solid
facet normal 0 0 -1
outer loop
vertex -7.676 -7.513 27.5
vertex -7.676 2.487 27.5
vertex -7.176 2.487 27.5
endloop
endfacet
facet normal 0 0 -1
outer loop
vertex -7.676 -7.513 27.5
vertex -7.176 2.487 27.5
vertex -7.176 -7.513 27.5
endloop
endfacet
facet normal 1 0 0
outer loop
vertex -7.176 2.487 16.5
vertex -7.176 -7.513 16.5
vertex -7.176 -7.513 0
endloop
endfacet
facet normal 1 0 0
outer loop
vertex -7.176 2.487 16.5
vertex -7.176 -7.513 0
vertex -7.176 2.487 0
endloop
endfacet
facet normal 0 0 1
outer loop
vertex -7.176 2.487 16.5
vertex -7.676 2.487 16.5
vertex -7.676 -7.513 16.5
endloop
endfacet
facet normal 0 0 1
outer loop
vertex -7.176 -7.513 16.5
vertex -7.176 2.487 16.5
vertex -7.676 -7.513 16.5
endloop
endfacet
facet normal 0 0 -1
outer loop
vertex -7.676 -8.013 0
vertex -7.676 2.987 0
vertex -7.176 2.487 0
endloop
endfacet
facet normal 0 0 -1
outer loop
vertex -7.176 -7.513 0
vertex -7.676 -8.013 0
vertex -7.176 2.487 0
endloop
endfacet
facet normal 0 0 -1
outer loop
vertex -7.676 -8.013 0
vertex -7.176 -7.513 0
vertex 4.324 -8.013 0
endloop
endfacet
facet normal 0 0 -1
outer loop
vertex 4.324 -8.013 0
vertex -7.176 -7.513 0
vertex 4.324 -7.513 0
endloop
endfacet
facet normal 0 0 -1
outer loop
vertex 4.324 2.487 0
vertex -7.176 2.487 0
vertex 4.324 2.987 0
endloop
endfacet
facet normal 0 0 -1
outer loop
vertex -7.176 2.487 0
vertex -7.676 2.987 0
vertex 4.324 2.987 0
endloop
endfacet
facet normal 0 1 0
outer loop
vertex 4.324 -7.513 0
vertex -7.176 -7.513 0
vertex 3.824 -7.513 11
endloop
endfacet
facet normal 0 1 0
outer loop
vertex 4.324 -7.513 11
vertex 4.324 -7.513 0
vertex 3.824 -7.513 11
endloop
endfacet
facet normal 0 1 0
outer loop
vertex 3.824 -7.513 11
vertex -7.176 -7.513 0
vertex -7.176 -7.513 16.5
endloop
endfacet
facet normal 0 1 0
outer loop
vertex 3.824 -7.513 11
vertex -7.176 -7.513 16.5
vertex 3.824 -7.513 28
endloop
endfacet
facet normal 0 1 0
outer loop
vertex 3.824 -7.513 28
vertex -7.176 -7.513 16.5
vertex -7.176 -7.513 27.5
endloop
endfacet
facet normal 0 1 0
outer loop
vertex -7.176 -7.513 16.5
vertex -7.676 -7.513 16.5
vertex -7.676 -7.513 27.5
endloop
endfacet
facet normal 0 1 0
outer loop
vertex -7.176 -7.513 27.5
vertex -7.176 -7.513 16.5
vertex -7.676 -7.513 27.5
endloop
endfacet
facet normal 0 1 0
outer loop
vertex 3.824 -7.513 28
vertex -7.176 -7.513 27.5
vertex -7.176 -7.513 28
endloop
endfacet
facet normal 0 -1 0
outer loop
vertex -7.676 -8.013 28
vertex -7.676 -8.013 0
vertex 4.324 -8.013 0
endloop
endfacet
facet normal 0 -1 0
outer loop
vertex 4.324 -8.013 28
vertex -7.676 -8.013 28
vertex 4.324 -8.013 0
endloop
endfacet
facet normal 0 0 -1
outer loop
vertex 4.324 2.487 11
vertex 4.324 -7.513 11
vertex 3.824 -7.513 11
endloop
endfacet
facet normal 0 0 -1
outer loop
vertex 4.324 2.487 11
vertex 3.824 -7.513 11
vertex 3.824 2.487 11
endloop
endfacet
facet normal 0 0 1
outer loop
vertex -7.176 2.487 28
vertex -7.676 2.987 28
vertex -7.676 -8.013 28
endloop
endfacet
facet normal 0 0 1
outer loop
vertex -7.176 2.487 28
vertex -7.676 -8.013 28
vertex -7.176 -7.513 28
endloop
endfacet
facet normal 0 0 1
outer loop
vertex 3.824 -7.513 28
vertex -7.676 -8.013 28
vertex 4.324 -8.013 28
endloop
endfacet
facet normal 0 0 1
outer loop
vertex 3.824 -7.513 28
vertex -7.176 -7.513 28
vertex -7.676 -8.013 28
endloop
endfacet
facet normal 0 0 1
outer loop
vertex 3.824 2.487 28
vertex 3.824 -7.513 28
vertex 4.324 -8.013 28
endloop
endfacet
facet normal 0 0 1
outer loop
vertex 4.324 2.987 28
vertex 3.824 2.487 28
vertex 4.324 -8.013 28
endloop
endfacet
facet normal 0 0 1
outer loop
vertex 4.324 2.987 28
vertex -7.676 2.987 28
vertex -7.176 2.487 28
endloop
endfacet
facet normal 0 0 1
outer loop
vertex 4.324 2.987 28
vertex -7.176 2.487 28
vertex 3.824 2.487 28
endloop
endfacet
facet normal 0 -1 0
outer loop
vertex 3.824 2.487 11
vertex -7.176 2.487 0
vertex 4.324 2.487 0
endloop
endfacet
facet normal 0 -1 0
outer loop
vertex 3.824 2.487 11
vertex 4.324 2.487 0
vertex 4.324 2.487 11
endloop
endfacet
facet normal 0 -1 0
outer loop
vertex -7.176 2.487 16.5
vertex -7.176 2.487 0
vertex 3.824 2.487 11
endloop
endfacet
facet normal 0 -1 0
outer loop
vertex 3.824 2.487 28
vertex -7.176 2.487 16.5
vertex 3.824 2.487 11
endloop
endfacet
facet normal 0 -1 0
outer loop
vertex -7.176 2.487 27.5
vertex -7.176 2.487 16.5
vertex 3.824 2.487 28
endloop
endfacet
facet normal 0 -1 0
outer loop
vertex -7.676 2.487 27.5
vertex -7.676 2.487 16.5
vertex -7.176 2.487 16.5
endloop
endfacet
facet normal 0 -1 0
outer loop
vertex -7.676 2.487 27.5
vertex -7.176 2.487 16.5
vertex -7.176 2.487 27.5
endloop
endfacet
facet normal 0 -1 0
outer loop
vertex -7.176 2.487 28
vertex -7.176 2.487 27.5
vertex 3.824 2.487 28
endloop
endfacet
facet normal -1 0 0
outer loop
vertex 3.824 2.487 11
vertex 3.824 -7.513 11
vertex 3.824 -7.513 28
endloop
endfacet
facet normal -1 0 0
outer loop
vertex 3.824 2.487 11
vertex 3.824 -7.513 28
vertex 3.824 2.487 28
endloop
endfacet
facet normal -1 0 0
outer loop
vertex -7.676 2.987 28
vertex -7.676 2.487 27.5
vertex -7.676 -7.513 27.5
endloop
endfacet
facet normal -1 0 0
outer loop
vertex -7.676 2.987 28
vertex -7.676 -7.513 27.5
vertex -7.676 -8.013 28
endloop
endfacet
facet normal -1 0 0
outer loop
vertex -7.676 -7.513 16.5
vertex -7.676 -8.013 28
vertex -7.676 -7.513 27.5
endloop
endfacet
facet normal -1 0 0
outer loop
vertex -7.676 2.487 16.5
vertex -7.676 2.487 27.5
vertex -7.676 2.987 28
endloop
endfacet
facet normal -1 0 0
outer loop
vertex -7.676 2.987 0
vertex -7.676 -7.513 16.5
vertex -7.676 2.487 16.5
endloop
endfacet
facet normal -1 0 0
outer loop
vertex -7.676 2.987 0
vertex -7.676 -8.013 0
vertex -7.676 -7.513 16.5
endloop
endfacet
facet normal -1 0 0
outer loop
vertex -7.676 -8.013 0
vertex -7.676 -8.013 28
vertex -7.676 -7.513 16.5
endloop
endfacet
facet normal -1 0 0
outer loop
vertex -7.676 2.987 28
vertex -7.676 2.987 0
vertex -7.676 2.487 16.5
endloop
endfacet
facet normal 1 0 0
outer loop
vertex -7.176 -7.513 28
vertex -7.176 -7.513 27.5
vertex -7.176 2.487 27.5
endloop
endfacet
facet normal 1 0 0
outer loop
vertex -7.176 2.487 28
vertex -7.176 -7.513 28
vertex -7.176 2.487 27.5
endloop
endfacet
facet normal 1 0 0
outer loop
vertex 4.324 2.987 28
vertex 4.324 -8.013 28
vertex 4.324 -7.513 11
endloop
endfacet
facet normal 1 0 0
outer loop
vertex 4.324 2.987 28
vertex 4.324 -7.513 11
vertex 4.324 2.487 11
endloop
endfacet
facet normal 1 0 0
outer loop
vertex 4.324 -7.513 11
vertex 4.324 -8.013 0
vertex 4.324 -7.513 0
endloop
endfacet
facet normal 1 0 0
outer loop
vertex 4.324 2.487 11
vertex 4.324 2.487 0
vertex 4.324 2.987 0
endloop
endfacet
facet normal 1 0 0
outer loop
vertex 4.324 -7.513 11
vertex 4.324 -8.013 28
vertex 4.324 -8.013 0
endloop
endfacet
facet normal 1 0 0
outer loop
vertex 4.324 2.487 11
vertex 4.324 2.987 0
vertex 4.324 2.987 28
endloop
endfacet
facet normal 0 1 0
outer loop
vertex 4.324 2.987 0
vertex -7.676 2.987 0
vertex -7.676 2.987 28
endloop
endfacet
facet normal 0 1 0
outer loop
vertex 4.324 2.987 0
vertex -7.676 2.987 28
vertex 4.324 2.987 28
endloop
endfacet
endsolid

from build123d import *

# Parameters (mm, degrees)
F0_W     = 12
F0_H     = 11
F0_W_2   = 11
F0_H_2   = 10
F1_DEPTH = 28
F2_W     = 10
F2_H     = 11
F3_DEPTH = 2
F4_W     = 10
F4_H     = 11
F5_DEPTH = 2


with BuildPart() as f1:
    # F0 (on Top) → F1 (new body)
    with BuildSketch(Plane.XY):
        with Locations((-1.675564, -2.512802)):
            Rectangle(F0_W, F0_H)
        with Locations((-1.675564, -2.512802)):
            Rectangle(F0_W_2, F0_H_2, mode=Mode.SUBTRACT)
    extrude(amount=F1_DEPTH)

    # F2 (on face) → F3 (cut)
    with BuildSketch(Plane.YZ.offset(4.324436)):
        with Locations((-2.512802, 5.5)):
            Rectangle(F2_W, F2_H)
    extrude(amount=-F3_DEPTH, mode=Mode.SUBTRACT)

    # F4 (on face) → F5 (cut)
    with BuildSketch(Plane(origin=(-7.675564, 0, 0), x_dir=(0, -1, 0), z_dir=(-1, 0, 0))):
        with Locations((2.512802, 22)):
            Rectangle(F4_W, F4_H)
    extrude(amount=-F5_DEPTH, mode=Mode.SUBTRACT)


solid = f1.part
